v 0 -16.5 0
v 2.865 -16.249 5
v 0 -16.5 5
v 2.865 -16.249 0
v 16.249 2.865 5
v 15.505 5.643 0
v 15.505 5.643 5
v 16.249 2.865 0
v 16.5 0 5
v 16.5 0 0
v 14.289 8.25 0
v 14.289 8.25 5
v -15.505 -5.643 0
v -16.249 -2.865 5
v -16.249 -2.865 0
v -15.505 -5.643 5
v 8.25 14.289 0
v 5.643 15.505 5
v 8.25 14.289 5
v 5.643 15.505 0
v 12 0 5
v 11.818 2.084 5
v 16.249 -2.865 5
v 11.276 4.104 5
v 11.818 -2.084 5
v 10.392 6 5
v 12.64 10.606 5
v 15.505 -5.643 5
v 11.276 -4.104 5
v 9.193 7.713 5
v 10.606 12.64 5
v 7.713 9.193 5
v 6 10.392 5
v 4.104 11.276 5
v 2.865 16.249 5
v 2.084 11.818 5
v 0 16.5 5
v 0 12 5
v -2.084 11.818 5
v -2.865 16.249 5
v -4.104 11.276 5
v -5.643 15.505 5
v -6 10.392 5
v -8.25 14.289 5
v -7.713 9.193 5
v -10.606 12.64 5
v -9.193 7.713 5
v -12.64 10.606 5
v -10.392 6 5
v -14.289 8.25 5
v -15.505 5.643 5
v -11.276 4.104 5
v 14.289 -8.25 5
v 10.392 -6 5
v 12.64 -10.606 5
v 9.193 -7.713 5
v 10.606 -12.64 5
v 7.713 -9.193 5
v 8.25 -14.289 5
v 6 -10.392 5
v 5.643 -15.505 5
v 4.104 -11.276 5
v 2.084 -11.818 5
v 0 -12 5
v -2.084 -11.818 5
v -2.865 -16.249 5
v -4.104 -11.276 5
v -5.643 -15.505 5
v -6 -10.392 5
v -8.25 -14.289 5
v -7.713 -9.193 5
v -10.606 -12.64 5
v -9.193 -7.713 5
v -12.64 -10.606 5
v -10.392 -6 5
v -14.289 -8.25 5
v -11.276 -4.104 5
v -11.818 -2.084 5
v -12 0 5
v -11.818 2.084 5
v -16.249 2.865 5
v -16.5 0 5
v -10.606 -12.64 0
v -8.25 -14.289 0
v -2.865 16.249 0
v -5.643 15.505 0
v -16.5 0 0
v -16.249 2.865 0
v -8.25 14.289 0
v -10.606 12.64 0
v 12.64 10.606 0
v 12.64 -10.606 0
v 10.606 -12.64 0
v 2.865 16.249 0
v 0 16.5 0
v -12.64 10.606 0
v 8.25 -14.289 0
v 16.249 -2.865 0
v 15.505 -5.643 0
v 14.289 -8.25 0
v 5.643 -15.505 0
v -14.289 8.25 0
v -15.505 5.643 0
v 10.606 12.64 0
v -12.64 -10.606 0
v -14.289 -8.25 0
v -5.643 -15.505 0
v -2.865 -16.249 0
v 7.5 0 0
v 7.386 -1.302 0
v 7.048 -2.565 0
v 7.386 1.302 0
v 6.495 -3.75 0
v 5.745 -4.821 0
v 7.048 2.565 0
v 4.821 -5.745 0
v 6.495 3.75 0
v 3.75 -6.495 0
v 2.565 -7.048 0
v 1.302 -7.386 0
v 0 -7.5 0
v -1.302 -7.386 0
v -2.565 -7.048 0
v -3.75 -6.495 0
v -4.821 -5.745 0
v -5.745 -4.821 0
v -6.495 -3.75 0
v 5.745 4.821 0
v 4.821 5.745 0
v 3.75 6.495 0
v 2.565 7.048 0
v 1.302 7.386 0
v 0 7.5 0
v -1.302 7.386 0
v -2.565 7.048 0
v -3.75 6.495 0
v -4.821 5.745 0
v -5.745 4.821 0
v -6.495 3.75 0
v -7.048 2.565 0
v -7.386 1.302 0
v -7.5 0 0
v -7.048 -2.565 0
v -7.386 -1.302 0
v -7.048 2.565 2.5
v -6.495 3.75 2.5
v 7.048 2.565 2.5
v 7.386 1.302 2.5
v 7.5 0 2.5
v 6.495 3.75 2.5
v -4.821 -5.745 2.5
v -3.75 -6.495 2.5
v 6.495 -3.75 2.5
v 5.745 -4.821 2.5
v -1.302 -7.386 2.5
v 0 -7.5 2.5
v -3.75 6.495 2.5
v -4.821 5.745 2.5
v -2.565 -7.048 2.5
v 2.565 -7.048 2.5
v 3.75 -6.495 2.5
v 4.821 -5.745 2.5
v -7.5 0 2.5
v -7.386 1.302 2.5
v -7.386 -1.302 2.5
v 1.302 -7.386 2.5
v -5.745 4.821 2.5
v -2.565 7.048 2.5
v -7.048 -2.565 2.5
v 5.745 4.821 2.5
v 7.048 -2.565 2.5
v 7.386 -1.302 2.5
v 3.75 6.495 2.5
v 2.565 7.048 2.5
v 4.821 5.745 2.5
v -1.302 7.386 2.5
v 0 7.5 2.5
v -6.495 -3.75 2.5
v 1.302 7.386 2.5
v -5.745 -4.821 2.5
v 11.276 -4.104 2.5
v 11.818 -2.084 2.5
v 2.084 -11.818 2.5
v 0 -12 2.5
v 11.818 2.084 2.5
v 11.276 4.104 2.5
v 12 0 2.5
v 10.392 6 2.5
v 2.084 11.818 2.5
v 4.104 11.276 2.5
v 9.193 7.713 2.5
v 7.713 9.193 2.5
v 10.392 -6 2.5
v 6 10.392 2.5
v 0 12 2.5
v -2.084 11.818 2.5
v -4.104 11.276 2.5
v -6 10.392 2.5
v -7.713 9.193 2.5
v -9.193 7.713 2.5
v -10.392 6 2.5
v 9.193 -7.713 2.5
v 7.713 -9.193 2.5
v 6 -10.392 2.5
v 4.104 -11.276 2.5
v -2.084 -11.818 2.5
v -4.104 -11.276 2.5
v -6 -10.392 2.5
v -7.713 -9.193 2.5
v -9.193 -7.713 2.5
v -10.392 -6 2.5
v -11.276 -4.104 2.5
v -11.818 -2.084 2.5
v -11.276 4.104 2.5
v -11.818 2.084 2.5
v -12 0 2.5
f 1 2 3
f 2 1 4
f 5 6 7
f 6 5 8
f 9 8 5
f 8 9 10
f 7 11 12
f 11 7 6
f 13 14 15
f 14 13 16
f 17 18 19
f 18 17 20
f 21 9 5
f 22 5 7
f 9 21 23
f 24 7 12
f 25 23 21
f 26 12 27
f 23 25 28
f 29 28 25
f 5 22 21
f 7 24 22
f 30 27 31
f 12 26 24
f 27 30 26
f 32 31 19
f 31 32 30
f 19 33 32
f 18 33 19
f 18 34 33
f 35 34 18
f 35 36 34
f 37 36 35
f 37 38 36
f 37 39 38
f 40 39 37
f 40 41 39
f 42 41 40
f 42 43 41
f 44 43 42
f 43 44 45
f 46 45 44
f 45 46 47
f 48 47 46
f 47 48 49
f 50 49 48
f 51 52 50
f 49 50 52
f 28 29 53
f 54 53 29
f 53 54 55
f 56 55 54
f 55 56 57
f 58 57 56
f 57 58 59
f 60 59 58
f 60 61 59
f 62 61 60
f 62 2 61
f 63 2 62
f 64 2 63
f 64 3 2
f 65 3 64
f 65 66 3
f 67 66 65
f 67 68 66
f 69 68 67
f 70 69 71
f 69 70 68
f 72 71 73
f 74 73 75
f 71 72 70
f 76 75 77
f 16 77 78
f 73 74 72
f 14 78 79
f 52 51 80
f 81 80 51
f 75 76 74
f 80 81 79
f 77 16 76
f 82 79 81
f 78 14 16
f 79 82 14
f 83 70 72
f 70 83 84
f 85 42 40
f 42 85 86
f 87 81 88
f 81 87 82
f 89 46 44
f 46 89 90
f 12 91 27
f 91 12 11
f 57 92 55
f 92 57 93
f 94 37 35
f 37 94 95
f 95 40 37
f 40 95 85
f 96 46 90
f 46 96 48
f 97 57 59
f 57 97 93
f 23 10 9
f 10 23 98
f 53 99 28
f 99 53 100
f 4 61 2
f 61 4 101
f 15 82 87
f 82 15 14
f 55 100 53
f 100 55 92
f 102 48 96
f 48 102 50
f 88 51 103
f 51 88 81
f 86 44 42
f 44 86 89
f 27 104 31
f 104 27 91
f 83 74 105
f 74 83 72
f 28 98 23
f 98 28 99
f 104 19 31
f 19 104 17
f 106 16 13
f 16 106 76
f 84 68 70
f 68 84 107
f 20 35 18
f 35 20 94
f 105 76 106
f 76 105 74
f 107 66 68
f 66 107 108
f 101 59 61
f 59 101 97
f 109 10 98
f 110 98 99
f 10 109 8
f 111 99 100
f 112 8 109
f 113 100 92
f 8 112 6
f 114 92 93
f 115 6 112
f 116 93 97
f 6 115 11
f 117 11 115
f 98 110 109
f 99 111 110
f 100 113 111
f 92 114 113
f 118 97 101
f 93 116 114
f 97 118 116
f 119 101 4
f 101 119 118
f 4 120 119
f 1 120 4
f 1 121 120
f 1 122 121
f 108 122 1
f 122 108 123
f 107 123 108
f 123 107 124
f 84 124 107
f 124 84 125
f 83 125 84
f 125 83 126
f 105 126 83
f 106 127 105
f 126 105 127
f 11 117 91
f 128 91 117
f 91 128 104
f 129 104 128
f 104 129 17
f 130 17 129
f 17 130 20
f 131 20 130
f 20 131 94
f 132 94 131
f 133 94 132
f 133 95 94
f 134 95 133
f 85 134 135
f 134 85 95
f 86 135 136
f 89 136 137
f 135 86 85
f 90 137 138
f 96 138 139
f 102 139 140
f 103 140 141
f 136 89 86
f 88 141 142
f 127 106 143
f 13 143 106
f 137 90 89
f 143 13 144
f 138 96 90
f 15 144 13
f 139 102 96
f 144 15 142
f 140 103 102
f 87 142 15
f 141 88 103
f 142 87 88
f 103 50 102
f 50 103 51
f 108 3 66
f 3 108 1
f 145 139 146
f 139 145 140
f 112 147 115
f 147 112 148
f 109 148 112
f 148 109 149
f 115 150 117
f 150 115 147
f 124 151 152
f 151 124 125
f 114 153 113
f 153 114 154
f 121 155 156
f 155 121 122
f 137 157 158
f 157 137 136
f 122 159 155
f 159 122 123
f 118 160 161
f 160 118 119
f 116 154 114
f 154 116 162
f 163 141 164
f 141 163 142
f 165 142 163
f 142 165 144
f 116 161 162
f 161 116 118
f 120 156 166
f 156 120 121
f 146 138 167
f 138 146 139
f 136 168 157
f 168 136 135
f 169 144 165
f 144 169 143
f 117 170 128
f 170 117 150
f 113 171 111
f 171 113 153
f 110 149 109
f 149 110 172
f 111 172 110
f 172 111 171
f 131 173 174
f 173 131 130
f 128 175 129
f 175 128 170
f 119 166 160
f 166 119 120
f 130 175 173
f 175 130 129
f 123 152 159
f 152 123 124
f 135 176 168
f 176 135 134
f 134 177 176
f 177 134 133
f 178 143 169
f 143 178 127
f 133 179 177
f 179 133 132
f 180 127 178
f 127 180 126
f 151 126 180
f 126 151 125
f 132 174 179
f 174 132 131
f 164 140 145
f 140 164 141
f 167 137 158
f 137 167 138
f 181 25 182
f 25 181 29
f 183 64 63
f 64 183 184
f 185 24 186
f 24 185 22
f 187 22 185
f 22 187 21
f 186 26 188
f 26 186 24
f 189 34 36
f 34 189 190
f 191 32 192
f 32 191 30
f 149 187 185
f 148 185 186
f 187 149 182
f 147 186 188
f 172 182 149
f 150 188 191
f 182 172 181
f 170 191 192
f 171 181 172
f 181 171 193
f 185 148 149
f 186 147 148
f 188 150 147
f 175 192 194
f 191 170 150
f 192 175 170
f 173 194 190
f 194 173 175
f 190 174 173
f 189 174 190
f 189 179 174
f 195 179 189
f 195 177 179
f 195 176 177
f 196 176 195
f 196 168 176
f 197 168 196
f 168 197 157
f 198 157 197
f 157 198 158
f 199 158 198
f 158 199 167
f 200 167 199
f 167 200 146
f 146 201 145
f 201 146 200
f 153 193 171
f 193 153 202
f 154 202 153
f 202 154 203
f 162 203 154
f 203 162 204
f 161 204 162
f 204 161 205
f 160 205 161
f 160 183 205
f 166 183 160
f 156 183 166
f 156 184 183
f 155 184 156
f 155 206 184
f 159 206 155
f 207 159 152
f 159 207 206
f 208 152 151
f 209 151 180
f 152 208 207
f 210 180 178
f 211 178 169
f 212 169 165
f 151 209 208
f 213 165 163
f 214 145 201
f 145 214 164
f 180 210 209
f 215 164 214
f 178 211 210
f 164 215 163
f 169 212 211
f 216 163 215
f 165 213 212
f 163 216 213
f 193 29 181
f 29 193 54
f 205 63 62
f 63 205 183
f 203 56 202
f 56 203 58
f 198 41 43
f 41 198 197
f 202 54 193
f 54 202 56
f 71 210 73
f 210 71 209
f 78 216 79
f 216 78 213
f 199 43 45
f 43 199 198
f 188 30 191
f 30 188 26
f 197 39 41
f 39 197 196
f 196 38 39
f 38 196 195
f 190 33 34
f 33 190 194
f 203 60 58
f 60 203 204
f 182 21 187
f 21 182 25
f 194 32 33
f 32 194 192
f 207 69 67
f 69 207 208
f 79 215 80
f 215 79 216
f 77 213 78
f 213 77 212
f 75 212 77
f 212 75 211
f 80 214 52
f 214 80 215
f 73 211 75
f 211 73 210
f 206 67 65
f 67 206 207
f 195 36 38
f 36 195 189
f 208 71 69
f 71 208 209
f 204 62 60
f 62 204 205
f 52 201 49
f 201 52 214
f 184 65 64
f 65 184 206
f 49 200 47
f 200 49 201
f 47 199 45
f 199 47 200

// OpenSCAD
//---------------------------------------------------------------------------------------------
//-- Printable holder for washer
//-- (c) Martin Korinek	m.ko@inode.at
//-- Jan-2015
//---------------------------------------------------------------------------------------------
//--
//---------------------------------------------------------------------------------------------

//fragment minimum angle
  $fa=10.0;

//fragment minimum size
  $fs=0.2;
  
difference()
{  
	cylinder(h = 5, d = 33);
	translate([0,0,-1])
	cylinder(h = 6, d = 15);
	translate([0,0,2.5])
	cylinder(h = 3, d = 24);
} 
